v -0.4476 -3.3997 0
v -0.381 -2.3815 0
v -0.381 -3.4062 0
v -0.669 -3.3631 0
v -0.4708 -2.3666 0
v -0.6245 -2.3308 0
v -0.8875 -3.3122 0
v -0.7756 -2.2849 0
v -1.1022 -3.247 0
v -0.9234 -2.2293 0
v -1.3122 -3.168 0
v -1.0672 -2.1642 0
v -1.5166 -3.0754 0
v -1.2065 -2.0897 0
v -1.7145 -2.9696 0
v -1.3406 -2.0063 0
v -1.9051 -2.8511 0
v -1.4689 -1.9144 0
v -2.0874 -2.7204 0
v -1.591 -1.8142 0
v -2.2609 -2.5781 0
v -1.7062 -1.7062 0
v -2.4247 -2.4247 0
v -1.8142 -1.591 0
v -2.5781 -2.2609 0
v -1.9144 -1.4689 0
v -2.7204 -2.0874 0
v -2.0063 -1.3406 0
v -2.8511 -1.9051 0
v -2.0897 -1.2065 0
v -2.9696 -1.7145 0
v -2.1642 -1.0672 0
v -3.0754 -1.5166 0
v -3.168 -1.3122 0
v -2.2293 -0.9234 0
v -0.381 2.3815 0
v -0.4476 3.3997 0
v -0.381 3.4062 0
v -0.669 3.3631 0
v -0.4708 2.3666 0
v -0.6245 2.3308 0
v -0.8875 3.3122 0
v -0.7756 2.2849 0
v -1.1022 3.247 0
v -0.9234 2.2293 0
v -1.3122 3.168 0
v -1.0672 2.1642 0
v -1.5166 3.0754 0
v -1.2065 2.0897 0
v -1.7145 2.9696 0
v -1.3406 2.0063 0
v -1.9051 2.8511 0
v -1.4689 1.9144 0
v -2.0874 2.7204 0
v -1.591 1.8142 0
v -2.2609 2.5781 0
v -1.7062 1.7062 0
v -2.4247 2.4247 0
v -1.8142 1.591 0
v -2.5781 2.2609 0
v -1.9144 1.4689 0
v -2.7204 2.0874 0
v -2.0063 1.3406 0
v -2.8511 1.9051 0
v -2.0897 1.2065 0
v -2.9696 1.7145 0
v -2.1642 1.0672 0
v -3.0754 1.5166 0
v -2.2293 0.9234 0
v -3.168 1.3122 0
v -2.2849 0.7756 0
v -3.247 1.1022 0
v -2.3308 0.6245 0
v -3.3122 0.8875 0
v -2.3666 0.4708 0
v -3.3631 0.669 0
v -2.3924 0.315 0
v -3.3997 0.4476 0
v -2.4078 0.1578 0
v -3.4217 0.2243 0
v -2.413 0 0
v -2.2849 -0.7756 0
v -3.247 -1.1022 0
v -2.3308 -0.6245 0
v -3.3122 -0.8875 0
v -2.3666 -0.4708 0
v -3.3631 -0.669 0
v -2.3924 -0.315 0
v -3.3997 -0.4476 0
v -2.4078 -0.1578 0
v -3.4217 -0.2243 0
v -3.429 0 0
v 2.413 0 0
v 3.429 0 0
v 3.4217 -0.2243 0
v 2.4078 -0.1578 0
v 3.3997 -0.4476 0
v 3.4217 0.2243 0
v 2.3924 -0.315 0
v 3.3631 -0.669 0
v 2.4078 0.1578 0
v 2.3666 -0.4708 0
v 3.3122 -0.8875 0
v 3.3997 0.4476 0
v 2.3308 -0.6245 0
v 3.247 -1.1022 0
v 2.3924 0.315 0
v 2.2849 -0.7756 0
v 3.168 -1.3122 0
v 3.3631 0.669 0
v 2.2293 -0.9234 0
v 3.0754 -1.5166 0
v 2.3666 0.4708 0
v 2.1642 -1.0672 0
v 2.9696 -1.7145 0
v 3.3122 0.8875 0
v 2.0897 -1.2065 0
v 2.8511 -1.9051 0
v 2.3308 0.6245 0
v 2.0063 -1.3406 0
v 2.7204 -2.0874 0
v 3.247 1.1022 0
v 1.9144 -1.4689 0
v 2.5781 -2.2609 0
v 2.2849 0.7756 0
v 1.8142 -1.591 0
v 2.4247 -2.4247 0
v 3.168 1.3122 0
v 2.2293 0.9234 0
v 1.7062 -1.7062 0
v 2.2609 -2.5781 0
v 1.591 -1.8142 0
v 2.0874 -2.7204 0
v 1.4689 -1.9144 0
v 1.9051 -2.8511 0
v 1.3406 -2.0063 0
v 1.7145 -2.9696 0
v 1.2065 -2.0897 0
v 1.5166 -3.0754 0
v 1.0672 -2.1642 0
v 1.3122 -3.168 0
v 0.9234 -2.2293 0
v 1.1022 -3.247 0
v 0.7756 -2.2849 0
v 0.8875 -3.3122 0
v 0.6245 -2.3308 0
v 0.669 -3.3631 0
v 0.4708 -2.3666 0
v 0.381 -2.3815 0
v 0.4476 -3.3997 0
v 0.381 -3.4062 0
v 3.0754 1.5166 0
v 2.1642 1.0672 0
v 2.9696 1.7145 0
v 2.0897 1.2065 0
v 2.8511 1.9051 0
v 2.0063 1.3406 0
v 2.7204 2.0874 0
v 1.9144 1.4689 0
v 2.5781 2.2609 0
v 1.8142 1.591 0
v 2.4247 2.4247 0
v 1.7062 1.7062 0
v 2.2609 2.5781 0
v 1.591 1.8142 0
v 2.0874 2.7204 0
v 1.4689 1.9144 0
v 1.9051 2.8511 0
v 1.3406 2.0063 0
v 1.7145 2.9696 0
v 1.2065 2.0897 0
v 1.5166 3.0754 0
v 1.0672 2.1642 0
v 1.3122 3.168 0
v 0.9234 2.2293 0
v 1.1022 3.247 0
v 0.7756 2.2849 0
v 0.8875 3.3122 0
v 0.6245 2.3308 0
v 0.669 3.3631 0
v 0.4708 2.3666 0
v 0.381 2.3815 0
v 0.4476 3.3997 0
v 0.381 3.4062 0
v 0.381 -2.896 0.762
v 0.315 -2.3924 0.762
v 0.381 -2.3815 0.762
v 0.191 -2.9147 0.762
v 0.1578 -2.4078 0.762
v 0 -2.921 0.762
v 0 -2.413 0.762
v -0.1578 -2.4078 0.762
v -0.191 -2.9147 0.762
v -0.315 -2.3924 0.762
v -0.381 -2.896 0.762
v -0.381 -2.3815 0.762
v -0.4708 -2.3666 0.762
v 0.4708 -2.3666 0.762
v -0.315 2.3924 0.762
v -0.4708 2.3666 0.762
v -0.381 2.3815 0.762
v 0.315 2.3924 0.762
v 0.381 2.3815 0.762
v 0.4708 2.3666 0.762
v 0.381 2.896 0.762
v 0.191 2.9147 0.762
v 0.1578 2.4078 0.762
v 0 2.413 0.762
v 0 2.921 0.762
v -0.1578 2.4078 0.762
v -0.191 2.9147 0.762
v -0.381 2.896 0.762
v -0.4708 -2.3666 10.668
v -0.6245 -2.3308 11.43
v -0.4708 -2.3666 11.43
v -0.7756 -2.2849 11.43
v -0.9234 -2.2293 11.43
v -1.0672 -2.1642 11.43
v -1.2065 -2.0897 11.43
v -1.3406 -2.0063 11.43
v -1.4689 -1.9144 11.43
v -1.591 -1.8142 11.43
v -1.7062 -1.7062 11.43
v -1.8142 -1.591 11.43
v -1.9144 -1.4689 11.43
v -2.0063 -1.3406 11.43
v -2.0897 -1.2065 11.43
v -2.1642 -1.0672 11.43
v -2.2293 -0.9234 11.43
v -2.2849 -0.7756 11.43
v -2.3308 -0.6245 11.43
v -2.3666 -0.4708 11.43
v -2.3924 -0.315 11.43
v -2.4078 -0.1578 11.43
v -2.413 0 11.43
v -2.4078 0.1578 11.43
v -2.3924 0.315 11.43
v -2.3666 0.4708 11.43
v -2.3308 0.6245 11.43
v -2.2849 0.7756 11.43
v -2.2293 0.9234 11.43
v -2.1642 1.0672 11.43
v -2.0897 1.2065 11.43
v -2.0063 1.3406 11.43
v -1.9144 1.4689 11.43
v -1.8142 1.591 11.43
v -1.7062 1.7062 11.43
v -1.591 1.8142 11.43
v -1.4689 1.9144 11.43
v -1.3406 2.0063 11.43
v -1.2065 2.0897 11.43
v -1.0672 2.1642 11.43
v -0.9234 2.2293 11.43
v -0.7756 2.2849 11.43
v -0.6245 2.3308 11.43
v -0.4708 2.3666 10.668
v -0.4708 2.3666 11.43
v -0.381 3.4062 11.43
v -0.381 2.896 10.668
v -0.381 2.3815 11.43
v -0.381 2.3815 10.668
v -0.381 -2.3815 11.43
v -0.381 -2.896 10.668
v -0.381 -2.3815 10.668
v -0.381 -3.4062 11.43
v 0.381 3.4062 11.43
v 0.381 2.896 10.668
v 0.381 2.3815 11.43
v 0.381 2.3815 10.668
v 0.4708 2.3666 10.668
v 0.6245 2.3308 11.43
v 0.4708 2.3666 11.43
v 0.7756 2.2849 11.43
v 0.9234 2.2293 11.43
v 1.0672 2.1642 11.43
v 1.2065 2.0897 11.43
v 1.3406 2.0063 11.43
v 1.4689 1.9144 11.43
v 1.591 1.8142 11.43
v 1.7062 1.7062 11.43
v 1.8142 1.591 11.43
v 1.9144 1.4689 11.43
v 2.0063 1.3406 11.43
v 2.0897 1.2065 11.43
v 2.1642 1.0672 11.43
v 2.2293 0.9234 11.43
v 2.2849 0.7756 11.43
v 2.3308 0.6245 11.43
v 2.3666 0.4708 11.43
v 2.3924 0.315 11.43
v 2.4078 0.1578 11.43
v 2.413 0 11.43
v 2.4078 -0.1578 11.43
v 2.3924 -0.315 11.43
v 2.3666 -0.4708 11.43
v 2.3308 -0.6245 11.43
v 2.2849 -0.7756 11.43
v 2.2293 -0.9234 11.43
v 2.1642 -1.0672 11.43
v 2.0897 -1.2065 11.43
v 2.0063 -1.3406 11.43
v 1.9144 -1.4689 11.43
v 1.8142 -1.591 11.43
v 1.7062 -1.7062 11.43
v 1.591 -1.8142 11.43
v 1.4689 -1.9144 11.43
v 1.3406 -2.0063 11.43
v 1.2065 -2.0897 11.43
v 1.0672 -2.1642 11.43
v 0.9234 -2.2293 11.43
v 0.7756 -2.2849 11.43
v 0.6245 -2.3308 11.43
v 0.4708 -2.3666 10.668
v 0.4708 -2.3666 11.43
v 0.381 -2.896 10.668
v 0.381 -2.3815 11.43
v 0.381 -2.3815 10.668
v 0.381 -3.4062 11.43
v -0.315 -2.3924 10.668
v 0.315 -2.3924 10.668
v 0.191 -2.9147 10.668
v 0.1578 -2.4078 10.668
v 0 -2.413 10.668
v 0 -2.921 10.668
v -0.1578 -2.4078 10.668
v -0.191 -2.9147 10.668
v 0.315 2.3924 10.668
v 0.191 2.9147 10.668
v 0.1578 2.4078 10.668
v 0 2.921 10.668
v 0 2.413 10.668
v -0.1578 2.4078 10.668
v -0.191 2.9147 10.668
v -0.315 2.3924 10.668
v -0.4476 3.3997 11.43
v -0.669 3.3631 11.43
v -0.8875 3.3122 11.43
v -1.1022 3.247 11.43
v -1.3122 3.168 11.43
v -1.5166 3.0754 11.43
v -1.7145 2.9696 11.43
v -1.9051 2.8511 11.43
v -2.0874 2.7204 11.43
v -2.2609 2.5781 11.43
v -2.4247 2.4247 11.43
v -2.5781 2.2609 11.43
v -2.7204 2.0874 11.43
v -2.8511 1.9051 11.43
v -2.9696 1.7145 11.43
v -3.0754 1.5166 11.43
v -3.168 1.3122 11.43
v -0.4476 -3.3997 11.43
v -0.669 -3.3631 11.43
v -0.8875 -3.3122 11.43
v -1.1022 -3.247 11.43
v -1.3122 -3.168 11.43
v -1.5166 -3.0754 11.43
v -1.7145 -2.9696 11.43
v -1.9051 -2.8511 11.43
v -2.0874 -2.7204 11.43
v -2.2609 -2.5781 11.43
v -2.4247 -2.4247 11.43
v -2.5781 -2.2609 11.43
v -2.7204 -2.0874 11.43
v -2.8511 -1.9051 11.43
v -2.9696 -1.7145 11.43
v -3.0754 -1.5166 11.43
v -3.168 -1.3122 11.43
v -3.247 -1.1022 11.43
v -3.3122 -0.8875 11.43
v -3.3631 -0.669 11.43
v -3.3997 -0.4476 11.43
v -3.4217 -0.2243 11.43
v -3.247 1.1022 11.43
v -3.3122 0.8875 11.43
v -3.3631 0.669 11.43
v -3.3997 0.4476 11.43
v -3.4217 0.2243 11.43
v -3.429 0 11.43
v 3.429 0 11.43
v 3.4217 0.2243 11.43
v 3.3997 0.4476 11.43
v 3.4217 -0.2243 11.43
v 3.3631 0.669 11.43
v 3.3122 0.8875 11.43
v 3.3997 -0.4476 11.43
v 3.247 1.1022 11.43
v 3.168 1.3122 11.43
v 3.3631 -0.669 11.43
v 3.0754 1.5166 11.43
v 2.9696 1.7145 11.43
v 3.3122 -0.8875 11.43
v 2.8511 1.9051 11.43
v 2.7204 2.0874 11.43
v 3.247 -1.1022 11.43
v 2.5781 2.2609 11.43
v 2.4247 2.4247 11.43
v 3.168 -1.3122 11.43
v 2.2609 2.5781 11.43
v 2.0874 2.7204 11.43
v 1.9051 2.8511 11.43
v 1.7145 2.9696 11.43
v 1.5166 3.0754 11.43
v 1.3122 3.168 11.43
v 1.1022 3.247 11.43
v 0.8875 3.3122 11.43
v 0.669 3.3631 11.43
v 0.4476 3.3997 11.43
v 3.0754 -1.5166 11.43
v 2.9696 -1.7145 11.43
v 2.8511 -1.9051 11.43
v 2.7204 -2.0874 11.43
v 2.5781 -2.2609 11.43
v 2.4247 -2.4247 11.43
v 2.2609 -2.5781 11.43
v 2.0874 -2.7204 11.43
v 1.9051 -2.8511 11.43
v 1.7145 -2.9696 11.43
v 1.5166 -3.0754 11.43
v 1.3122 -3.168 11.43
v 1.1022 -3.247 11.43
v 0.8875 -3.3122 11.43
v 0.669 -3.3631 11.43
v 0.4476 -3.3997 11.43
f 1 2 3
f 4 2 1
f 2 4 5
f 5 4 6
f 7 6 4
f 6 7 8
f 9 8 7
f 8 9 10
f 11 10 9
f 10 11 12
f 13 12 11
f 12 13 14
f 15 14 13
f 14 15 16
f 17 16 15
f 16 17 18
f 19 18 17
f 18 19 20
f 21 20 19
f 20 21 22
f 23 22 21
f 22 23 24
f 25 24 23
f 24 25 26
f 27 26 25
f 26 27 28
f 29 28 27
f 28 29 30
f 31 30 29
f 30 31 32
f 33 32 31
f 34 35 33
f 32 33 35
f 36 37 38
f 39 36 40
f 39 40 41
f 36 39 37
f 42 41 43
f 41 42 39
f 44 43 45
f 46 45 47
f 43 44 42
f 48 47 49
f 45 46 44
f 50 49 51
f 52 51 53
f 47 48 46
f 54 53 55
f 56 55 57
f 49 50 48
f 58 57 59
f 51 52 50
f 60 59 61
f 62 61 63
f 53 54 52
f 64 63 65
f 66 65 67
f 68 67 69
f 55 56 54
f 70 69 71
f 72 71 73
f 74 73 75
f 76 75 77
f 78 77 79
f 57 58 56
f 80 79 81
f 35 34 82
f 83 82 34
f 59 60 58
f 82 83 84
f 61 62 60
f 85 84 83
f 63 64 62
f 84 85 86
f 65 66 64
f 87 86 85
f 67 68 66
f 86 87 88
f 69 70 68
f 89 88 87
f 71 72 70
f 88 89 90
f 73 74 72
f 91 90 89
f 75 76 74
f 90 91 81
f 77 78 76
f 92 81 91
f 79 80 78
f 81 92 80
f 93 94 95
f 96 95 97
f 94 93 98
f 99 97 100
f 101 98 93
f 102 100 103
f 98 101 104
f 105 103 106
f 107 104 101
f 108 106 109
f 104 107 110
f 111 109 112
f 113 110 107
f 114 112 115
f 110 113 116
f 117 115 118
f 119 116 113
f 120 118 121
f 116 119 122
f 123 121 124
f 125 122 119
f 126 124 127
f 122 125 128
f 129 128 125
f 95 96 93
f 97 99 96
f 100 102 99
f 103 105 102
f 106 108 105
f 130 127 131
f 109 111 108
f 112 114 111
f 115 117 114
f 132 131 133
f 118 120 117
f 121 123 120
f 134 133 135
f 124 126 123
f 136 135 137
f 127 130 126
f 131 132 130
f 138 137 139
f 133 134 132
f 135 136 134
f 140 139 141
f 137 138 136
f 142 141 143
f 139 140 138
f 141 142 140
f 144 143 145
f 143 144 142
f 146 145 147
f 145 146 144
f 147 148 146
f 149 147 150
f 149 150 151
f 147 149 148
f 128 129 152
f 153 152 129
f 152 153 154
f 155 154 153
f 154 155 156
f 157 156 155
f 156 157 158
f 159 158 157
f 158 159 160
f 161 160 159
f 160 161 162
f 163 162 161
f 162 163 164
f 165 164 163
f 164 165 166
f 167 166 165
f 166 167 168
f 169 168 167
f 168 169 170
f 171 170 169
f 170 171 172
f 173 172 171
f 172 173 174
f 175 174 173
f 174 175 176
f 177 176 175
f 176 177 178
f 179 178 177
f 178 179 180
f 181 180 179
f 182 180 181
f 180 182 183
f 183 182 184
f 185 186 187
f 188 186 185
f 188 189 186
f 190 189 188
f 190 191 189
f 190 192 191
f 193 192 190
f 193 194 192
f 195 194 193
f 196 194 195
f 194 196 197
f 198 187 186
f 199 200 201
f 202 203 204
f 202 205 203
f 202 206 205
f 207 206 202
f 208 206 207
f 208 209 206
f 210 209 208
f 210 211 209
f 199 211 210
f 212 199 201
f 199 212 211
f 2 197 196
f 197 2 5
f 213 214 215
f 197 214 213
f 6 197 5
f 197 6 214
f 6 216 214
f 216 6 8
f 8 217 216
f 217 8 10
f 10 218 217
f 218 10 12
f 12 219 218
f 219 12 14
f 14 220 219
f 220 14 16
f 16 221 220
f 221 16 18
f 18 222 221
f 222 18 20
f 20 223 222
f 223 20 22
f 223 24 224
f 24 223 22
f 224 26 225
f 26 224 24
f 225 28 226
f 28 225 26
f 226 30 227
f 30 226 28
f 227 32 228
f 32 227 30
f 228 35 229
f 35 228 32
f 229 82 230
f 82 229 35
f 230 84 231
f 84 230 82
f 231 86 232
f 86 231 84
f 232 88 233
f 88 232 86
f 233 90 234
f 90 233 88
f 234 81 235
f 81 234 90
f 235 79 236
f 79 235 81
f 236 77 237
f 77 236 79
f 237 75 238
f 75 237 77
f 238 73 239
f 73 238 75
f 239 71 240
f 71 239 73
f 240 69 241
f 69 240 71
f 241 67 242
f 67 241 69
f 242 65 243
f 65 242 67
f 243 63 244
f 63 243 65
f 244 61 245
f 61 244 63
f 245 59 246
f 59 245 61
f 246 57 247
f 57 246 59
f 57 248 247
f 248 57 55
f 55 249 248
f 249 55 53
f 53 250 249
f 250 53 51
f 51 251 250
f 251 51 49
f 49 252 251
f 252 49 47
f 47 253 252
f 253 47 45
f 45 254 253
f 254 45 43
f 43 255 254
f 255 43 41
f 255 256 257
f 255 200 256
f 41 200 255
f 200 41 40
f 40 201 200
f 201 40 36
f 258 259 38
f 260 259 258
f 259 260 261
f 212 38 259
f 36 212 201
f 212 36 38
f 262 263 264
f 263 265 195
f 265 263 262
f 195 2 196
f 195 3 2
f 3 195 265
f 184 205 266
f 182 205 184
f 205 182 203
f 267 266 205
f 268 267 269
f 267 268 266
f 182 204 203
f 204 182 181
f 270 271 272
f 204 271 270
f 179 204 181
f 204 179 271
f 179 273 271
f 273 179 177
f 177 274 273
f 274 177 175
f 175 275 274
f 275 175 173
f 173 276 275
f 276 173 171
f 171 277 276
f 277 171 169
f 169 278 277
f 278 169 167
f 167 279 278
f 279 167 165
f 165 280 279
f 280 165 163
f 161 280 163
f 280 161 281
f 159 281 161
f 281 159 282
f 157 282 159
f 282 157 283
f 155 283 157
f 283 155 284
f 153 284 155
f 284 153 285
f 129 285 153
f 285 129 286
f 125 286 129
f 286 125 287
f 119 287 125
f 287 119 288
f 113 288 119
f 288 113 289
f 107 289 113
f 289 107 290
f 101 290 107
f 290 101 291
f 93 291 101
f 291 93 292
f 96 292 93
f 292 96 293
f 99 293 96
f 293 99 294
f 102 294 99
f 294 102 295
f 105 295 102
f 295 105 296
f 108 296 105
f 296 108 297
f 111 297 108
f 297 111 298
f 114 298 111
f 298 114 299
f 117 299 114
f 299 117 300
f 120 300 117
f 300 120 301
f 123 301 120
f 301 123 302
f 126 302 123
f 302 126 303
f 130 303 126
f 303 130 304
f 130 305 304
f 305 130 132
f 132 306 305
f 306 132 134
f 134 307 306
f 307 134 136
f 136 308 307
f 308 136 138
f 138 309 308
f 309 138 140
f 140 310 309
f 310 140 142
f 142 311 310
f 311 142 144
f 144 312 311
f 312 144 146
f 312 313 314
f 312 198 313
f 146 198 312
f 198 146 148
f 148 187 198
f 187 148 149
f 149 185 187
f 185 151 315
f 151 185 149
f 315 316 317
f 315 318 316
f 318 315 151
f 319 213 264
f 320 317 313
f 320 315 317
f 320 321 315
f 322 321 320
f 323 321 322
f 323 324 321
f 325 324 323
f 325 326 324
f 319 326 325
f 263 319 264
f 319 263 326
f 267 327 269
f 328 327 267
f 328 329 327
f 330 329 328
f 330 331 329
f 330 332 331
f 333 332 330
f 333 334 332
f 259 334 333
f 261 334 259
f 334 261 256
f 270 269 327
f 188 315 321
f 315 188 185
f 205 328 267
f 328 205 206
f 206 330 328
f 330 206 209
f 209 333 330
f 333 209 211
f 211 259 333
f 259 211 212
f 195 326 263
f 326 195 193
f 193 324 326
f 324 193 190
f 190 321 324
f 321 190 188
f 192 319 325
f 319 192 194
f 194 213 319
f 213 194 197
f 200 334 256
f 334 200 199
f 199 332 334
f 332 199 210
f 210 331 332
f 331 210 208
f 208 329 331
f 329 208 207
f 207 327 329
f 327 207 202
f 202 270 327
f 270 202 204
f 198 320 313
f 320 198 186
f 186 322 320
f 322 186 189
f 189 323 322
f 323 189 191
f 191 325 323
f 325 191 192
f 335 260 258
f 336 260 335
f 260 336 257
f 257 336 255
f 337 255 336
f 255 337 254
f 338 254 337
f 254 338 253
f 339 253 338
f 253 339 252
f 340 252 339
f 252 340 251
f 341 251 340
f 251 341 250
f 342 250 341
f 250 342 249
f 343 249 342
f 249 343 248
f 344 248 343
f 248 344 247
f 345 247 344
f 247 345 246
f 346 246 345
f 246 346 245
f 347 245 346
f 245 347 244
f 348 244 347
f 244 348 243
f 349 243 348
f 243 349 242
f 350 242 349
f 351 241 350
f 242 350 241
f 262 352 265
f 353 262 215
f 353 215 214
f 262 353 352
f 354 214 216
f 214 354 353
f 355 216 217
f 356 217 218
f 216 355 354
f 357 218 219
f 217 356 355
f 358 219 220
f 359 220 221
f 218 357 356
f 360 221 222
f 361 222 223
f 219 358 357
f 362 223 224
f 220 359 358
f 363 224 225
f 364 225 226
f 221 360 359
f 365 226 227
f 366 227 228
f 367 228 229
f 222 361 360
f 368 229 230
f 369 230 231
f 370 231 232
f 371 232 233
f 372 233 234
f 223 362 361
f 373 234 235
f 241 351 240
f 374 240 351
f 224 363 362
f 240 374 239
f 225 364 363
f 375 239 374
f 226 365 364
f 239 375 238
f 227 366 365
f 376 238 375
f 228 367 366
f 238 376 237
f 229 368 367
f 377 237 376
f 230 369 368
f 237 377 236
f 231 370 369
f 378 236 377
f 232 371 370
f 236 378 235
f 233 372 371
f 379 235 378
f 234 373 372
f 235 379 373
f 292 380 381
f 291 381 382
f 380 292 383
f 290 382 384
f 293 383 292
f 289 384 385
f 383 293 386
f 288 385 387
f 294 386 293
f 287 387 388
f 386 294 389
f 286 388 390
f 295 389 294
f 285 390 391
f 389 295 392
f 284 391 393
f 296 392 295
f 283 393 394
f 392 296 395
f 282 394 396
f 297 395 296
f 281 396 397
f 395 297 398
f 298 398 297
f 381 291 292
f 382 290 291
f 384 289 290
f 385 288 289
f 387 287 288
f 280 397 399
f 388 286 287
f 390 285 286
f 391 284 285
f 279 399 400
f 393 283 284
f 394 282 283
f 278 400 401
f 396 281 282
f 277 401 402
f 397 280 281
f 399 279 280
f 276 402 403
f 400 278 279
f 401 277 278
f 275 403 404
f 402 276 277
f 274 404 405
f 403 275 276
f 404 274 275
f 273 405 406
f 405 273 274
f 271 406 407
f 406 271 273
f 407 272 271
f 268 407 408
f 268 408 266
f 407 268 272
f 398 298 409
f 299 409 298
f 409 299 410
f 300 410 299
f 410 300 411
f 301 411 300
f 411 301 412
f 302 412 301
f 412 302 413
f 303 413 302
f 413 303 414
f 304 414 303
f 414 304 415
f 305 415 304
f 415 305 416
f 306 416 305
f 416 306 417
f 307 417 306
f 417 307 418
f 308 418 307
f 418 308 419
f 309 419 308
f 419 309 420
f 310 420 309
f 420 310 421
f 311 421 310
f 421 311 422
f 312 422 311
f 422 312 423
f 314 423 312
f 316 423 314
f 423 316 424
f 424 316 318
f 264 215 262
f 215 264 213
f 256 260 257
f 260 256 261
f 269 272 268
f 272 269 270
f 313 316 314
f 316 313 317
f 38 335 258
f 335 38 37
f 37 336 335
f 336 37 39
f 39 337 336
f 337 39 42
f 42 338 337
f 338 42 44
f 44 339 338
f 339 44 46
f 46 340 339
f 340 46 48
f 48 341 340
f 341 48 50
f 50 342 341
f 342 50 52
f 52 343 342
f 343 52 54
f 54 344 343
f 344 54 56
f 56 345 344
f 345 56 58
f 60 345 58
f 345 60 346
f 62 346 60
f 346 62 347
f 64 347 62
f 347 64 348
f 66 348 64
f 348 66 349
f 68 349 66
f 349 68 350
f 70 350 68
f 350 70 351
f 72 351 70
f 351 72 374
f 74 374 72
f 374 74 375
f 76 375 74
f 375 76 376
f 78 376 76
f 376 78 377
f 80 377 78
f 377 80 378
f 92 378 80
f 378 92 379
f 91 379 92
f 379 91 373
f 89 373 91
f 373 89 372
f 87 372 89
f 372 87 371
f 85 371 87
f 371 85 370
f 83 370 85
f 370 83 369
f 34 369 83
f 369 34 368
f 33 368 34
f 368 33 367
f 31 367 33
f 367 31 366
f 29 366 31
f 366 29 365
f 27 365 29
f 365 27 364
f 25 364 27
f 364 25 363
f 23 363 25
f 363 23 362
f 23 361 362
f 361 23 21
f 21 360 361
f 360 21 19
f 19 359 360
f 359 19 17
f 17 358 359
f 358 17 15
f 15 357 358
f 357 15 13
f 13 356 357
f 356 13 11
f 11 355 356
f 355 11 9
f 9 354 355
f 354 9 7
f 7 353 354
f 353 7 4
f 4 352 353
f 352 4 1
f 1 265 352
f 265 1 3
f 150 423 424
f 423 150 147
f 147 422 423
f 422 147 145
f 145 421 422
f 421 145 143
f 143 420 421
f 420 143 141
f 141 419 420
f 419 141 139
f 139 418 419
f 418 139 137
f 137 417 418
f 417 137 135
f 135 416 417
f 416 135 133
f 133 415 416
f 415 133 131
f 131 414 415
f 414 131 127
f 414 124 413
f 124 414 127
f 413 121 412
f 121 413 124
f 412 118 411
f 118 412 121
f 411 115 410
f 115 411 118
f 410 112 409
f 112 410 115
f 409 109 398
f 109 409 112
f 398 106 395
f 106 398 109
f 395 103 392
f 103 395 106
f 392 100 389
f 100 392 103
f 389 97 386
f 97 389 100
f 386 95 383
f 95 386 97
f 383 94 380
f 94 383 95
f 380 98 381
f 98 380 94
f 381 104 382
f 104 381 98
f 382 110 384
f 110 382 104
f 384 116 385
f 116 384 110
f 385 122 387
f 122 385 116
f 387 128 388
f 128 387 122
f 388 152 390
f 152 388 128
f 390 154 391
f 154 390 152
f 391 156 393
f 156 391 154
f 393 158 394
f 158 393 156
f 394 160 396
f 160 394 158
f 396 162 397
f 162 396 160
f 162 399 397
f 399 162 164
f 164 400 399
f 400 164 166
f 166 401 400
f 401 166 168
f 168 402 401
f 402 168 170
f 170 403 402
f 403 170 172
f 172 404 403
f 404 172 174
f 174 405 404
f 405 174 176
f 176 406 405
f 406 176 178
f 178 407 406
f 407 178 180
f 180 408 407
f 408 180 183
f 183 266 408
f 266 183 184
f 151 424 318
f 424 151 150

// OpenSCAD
ViewScale = [0.0254, 0.0254, 0.0254];

module cutoutCircle()
{
    difference () {
        circle(115, $fn=96);
        circle(95, $fn=96);
        square([30, 300], center=true);
    }
}

module columns()
{
//    linear_extrude(450) 
//    circle(65, $fn=96);

    linear_extrude(30) 
    cutoutCircle();

    translate([0, 0, 30])
    linear_extrude(390) 
    difference () {
        circle(115, $fn=96);
        circle(95, $fn=96);
    }

    translate([0, 0, 420])
    linear_extrude(30) 
    cutoutCircle();

    linear_extrude(450)
    difference() {
        circle(135, $fn=96);
        circle(110, $fn=96);
        square([30, 300], center=true);
    }
}

scale(ViewScale)
{
    columns();
}
